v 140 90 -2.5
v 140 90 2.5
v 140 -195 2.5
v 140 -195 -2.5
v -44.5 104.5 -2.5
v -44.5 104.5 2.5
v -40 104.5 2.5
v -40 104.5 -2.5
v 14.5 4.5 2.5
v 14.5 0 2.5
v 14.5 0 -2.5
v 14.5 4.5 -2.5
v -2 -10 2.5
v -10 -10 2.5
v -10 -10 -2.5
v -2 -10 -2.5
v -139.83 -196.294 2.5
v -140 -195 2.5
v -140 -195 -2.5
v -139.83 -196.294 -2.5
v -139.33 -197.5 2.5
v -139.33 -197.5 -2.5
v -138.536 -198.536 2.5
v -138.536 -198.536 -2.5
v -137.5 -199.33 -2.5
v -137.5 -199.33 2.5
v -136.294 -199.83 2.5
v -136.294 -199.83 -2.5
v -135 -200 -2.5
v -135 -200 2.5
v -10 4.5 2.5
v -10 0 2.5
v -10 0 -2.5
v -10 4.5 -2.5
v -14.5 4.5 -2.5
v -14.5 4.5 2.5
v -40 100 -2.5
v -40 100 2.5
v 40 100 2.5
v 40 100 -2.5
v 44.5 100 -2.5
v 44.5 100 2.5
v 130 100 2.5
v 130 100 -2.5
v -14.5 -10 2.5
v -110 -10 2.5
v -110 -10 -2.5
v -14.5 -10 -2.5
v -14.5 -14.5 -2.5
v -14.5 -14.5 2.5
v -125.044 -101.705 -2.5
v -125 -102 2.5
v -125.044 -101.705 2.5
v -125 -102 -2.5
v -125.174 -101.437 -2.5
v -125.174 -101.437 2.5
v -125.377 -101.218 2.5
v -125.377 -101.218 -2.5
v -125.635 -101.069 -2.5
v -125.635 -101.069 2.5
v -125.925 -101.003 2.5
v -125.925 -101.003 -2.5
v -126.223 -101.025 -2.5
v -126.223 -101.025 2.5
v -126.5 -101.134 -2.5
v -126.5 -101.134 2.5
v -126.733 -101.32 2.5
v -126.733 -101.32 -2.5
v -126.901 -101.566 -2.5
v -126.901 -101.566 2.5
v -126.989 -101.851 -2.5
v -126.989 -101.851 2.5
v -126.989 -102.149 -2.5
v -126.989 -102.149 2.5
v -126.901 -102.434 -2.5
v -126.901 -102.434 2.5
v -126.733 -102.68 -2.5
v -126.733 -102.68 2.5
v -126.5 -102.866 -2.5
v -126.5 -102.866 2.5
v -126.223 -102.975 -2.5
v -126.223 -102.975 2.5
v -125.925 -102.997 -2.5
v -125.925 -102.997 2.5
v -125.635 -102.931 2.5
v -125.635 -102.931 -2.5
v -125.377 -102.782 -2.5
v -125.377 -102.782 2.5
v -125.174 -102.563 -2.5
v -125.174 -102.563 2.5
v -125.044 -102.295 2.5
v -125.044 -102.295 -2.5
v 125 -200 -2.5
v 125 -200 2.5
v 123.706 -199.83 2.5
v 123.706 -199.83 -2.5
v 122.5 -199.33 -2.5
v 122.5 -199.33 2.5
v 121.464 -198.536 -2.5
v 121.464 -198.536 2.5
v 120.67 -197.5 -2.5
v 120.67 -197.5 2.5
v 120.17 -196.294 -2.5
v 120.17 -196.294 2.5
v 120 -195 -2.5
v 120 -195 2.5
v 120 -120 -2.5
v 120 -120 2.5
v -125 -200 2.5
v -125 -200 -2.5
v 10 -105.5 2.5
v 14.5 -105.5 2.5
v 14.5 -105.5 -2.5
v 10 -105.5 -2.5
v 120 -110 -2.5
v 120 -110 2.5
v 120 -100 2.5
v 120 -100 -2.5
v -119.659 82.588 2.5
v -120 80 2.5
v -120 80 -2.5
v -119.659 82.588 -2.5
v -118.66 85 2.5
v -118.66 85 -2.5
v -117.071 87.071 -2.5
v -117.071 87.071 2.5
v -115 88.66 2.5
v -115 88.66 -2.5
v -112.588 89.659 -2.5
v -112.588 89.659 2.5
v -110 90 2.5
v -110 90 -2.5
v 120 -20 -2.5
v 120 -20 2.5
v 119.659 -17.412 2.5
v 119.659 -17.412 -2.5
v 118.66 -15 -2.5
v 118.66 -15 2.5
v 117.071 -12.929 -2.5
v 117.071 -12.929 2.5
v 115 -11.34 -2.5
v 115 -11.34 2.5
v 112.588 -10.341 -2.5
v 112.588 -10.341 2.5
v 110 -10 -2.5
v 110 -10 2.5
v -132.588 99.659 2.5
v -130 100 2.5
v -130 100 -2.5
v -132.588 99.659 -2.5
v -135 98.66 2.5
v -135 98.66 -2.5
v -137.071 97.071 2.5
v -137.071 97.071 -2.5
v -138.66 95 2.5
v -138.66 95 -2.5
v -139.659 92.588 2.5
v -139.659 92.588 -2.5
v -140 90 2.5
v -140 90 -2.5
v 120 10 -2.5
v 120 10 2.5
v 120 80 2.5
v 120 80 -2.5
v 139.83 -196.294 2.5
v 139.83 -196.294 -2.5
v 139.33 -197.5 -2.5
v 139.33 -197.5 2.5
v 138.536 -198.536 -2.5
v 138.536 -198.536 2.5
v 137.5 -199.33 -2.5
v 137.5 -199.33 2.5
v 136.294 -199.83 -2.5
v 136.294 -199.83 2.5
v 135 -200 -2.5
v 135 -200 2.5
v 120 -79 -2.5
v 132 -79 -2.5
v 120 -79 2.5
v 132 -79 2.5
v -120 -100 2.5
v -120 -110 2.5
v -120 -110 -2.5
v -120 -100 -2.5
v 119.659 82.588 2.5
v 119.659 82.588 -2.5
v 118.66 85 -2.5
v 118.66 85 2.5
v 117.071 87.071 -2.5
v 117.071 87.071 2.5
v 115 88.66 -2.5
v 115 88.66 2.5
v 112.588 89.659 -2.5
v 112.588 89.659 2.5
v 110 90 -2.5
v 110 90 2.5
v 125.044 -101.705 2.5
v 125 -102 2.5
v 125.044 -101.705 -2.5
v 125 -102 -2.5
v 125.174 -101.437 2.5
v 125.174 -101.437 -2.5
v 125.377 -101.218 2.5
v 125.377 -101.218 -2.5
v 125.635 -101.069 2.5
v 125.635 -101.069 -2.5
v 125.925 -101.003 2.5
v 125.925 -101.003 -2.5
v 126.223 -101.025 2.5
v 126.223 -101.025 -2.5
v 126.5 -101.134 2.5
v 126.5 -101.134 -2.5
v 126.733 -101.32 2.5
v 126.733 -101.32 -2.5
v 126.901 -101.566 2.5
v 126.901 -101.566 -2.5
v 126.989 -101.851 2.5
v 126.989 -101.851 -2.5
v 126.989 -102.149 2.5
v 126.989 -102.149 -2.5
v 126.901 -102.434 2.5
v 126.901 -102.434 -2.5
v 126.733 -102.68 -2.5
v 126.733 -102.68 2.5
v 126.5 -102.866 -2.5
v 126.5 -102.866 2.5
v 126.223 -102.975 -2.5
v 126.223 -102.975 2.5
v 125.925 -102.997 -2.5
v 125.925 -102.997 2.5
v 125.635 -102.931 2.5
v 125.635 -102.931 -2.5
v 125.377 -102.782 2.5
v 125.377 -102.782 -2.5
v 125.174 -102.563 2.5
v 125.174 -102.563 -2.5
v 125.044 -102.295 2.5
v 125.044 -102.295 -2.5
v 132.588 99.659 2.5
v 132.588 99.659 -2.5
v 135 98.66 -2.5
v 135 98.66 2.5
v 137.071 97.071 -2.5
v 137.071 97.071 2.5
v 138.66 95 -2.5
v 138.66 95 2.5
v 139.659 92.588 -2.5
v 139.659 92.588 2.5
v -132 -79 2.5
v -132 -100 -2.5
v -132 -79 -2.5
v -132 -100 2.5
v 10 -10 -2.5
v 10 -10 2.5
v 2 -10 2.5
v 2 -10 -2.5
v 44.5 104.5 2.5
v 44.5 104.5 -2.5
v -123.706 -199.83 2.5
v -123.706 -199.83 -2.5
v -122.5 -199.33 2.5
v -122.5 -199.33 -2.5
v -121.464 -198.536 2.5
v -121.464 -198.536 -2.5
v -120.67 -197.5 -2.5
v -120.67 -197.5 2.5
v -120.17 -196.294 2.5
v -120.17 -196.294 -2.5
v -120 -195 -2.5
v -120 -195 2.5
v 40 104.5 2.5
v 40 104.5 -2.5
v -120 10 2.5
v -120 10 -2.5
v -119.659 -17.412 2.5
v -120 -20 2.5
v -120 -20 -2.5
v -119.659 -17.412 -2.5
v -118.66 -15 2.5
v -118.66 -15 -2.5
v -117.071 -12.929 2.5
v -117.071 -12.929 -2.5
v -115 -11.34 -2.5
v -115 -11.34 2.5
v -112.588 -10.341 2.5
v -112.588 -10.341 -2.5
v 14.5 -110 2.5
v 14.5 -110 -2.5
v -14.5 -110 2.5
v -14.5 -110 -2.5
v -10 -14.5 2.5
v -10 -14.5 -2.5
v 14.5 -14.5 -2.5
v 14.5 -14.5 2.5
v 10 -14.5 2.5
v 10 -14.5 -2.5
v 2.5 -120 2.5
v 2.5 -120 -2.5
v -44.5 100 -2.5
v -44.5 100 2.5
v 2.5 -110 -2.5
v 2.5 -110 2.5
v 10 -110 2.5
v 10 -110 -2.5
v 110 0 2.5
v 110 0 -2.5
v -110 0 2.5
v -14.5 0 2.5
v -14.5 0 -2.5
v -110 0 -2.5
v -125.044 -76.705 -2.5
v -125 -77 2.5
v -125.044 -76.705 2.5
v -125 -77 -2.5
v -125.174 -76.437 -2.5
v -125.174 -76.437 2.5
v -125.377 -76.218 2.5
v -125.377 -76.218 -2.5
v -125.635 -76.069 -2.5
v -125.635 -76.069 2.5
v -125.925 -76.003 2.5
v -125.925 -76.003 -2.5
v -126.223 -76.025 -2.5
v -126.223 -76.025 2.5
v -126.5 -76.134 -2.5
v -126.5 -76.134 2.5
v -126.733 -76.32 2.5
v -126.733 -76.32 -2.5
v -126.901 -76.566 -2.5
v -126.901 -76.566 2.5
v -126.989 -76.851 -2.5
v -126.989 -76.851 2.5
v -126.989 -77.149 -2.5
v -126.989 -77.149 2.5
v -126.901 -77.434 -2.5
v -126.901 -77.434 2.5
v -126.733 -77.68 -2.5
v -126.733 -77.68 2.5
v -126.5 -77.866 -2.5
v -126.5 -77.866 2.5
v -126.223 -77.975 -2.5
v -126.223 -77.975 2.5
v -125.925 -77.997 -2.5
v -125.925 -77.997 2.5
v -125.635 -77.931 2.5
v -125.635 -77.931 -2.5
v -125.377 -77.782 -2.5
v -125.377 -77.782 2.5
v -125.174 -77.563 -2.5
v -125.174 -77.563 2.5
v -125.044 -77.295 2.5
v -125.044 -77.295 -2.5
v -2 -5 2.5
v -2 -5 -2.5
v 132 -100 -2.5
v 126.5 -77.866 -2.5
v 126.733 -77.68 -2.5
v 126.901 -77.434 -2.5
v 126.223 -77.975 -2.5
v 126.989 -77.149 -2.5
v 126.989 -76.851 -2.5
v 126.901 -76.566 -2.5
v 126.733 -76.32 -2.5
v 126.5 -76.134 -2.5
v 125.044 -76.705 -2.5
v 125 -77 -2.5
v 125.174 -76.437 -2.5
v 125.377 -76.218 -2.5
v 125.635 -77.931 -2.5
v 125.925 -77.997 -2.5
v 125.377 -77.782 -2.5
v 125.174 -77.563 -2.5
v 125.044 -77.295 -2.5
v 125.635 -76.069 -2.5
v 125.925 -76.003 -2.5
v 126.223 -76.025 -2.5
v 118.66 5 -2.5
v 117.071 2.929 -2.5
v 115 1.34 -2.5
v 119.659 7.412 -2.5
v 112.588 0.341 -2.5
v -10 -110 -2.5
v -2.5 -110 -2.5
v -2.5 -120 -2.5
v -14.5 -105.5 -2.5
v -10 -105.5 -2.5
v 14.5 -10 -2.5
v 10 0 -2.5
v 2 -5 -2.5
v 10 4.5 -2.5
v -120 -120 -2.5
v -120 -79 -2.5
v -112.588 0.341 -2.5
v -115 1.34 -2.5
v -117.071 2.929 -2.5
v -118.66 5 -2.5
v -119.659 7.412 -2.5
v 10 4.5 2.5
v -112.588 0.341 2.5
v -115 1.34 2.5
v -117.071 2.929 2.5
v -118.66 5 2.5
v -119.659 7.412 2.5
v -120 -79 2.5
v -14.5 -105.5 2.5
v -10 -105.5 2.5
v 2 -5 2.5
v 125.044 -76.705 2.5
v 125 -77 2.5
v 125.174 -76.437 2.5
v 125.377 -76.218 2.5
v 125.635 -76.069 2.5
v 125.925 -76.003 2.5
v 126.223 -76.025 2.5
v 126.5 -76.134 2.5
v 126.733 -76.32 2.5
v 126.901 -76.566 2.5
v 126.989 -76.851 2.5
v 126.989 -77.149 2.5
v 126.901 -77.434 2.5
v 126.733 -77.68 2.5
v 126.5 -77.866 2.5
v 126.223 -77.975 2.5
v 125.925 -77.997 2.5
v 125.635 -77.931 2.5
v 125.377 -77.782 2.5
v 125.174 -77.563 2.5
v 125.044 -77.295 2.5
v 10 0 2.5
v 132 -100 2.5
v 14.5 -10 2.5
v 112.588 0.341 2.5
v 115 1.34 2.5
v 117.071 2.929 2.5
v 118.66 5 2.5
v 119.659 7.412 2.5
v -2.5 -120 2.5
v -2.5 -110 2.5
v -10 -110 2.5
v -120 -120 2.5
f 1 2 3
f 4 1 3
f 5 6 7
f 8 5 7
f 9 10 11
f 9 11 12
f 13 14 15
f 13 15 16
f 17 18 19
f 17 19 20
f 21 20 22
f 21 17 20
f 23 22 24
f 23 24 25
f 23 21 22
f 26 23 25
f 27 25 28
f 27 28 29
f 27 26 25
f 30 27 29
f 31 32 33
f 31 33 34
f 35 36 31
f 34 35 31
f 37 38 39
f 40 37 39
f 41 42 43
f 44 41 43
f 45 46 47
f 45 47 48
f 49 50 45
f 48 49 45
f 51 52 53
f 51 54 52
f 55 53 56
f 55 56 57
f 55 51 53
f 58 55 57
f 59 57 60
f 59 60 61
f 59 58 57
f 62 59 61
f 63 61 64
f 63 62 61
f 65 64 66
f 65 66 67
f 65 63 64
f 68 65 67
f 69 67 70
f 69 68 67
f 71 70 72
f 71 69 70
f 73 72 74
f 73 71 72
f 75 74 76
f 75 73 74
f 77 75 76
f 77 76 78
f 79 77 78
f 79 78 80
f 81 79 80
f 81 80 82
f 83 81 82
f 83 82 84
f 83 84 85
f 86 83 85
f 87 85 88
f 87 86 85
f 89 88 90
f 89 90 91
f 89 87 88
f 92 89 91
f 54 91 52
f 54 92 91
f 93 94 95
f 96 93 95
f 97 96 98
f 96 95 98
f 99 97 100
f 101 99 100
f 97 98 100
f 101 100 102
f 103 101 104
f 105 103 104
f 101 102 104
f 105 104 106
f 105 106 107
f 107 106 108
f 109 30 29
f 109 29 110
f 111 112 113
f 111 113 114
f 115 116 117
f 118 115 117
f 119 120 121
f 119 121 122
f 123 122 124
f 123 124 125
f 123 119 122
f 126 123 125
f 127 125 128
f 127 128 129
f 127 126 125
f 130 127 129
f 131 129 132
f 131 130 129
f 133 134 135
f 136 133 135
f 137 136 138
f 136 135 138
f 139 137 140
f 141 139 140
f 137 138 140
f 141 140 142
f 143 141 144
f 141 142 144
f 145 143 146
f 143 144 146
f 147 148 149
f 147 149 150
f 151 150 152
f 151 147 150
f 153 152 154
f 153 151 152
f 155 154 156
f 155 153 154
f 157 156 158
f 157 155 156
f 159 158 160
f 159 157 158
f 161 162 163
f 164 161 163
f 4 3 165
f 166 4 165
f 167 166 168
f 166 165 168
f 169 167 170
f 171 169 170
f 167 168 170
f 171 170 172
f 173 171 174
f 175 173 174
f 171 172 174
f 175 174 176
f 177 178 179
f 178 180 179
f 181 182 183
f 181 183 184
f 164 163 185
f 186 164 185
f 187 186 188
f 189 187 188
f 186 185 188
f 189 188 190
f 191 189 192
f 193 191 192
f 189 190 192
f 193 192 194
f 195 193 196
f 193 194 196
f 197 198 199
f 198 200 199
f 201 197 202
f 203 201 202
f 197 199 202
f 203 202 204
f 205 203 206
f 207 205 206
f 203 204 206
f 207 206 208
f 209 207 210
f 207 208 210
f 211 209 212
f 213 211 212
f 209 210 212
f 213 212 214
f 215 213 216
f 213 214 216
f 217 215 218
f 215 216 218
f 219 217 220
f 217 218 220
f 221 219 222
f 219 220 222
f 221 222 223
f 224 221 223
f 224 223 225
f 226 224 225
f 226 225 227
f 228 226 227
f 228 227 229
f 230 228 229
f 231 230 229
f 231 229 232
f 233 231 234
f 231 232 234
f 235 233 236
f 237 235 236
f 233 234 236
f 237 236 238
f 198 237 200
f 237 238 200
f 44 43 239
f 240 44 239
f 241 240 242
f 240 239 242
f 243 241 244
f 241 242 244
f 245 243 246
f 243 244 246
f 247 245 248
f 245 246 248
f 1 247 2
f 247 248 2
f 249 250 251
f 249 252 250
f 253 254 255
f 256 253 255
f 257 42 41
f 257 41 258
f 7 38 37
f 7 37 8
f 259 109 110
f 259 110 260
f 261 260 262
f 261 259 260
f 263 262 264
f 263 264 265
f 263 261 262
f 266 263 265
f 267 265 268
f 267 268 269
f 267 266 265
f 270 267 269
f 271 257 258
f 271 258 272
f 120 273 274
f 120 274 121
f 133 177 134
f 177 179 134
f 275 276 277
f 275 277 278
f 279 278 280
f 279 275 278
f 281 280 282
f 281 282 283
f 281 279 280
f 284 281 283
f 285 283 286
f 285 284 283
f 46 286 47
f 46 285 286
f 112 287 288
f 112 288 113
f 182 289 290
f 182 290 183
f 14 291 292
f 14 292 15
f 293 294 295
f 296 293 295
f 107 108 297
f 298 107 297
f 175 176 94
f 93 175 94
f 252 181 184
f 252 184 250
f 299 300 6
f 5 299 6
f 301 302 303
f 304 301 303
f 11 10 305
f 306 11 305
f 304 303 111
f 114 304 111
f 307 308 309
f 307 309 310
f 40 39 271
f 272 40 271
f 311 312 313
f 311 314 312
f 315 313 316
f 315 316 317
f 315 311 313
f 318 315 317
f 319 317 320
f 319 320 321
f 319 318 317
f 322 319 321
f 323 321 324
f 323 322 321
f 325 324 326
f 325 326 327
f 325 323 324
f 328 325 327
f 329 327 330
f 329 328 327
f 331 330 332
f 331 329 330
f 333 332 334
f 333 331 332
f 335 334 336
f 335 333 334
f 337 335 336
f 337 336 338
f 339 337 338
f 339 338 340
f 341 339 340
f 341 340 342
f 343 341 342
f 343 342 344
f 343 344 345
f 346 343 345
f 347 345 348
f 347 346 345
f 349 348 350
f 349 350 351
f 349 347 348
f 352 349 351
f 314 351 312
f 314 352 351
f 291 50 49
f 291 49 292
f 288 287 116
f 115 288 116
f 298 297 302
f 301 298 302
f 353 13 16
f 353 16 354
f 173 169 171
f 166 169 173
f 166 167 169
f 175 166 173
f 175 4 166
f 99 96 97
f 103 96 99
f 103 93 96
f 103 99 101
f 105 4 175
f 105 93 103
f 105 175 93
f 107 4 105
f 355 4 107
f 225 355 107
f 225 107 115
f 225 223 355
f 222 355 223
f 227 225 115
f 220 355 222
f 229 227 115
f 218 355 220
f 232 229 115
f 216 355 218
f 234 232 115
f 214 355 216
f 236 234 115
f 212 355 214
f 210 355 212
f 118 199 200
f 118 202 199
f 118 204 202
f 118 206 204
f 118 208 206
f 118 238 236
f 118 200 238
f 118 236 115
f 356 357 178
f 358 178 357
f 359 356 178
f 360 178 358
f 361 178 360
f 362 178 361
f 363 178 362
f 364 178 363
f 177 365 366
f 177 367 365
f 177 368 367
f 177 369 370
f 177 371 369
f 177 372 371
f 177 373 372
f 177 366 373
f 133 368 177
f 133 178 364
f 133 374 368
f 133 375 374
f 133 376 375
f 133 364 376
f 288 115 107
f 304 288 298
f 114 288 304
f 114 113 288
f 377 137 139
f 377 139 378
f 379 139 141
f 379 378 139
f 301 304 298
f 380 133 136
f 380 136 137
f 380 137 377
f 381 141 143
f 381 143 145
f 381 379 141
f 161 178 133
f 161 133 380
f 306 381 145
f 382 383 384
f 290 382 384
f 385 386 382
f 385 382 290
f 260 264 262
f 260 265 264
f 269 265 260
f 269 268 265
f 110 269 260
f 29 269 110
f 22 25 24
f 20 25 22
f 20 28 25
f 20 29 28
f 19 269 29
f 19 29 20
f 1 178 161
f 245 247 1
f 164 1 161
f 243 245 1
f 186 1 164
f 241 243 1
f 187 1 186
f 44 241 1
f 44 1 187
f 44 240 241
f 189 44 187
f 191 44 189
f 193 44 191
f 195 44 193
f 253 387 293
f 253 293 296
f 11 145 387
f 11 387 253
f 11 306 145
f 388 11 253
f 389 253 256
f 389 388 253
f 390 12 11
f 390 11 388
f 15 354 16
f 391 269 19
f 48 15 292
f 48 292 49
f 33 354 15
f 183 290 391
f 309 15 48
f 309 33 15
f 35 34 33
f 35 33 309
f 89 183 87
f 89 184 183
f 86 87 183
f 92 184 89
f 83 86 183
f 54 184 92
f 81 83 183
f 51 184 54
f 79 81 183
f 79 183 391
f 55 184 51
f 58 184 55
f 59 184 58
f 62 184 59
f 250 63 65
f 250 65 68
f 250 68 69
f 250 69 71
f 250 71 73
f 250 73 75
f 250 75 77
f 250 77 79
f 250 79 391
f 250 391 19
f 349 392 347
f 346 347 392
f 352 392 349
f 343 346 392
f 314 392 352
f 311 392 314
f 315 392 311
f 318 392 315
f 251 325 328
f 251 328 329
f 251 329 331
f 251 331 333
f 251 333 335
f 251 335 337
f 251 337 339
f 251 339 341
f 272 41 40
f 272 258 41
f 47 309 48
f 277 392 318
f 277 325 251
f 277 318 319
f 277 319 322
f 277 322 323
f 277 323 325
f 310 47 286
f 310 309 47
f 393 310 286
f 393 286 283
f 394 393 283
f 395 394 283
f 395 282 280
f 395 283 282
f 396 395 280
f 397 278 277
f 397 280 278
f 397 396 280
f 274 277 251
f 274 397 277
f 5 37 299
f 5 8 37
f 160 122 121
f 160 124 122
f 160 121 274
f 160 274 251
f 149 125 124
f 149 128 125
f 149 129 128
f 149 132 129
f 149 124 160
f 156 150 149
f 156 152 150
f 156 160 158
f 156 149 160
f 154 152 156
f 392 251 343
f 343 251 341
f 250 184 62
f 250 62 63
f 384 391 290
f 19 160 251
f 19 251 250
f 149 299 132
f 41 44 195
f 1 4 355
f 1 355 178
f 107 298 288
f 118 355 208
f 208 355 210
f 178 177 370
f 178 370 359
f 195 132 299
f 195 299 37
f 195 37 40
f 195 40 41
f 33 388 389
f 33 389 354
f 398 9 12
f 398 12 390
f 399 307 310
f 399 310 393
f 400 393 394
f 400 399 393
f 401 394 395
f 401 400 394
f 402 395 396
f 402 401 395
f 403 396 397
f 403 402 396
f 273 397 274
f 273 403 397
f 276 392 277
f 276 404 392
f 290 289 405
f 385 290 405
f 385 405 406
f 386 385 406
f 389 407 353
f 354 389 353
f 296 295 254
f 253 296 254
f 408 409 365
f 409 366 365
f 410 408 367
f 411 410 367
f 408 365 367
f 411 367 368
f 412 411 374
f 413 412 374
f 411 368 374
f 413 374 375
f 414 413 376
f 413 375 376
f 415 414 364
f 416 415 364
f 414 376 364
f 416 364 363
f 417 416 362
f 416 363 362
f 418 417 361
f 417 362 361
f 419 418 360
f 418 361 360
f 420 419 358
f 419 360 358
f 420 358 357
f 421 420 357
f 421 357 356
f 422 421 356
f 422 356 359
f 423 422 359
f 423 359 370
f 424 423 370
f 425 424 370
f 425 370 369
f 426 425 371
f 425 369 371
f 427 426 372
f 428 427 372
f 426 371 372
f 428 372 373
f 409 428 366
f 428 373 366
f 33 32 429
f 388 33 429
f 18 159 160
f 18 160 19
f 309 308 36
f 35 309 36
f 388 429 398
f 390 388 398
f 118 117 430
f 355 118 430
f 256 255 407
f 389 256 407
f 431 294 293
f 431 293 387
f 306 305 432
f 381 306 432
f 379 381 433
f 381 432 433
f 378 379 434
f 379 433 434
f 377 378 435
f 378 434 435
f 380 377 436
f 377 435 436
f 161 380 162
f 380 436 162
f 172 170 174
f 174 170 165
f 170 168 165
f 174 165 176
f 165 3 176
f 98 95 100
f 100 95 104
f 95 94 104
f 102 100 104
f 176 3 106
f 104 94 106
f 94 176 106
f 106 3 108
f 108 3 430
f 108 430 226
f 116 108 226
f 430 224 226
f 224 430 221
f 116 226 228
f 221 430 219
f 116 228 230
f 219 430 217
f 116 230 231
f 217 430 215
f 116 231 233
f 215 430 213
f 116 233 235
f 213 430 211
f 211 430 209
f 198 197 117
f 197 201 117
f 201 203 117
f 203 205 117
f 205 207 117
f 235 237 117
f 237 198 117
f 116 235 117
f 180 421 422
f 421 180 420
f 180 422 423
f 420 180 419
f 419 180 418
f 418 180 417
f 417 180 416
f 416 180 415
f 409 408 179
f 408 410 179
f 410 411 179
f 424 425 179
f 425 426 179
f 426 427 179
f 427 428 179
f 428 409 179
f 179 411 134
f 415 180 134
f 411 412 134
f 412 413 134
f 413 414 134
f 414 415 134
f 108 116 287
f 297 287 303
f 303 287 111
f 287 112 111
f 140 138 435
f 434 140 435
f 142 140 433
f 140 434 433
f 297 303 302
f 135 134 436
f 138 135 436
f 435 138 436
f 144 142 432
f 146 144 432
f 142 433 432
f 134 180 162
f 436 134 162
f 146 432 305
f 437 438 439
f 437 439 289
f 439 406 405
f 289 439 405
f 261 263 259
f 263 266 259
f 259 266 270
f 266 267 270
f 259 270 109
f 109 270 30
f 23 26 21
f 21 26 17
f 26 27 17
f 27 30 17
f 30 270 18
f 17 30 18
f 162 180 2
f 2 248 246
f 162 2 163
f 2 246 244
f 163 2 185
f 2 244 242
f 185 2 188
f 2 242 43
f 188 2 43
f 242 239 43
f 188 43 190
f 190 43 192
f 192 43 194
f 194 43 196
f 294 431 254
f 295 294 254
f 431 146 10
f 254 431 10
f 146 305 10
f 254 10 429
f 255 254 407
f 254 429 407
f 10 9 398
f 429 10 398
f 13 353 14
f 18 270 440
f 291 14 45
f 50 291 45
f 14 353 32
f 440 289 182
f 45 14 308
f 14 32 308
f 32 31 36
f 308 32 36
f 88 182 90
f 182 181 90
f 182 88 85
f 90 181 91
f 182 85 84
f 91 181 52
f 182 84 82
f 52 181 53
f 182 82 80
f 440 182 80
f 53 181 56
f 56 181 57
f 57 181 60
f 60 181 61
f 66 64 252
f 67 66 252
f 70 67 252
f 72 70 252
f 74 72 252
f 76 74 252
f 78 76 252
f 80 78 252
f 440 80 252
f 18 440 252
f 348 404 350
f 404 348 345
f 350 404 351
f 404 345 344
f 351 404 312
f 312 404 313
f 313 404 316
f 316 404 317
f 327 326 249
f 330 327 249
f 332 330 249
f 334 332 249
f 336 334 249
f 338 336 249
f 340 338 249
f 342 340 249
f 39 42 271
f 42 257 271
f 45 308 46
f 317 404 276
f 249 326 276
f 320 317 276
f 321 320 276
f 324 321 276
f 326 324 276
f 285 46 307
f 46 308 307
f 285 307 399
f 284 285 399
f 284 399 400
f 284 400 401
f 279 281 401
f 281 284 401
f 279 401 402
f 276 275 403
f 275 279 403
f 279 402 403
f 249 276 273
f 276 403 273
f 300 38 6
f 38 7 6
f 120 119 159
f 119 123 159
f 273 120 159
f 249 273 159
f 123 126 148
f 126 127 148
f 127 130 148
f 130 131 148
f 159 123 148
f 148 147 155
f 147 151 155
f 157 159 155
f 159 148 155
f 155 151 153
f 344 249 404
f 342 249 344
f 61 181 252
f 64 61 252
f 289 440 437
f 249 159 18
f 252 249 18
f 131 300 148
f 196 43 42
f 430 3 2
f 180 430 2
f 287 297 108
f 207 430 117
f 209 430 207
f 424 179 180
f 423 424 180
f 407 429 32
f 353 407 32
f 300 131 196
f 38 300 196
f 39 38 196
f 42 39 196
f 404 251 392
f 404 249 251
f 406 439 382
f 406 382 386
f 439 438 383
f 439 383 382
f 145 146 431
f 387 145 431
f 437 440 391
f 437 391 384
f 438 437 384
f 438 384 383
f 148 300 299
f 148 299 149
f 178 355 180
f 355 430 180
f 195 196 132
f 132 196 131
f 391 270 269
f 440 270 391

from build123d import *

# Parameters (mm, degrees)
SKETCH1_R           = 1
SKETCH1_W           = 4.5
SKETCH1_H           = 4.5
SKETCH1_W_2         = 2
SKETCH1_H_2         = 5
BOSS_EXTRUDE1_DEPTH = 2.5


with BuildPart() as part:
    # Sketch1 → Boss-Extrude1 (new body, symmetric)
    with BuildSketch(Plane.XY):
        with BuildLine():
            Line((-120, -79), (-120, -20))
            ThreePointArc((-120, -20), (-117.071067812, -12.928932188), (-110, -10))
            Line((-110, -10), (-14.5, -10))
            Line((-14.5, -10), (-10, -10))
            Line((-10, -10), (-2, -10))
            Line((-2, -10), (-2, -5))
            Line((-2, -5), (-2, 0))
            Line((-2, 0), (-10, 0))
            Line((-10, 0), (-14.5, 0))
            Line((-14.5, 0), (-110, 0))
            ThreePointArc((-110, 0), (-117.071067812, 2.928932188), (-120, 10))
            Line((-120, 10), (-120, 80))
            ThreePointArc((-120, 80), (-117.071067812, 87.071067812), (-110, 90))
            Line((-110, 90), (0, 90))
            Line((0, 90), (0, 100))
            Line((0, 100), (-40, 100))
            Line((-40, 100), (-44.5, 100))
            Line((-44.5, 100), (-120, 100))
            Line((-120, 100), (-130, 100))
            ThreePointArc((-130, 100), (-137.071067812, 97.071067812), (-140, 90))
            Line((-140, 90), (-140, -195))
            ThreePointArc((-140, -195), (-138.535533906, -198.535533906), (-135, -200))
            Line((-135, -200), (-125, -200))
            ThreePointArc((-125, -200), (-121.464466094, -198.535533906), (-120, -195))
            Line((-120, -195), (-120, -120))
            Line((-120, -120), (-120, -110))
            Line((-120, -110), (-120, -100))
            Line((-120, -100), (-132, -100))
            Line((-132, -100), (-132, -79))
            Line((-132, -79), (-120, -79))
        make_face()
        with Locations((-126, -102)):
            Circle(SKETCH1_R, mode=Mode.SUBTRACT)
        with Locations((-126, -77)):
            Circle(SKETCH1_R, mode=Mode.SUBTRACT)
        with Locations((-42.25, 102.25)):
            Rectangle(SKETCH1_W, SKETCH1_H)
        with Locations((-12.25, 2.25)):
            Rectangle(SKETCH1_W, SKETCH1_H)
        with Locations((-12.25, -12.25)):
            Rectangle(SKETCH1_W, SKETCH1_H)
        with Locations((-1, -2.5)):
            Rectangle(SKETCH1_W_2, SKETCH1_H_2)
        Polygon((-14.5, -110), (-120, -110), (-120, -120), (-2.5, -120), (-2.5, -110), (-10, -110), align=None)
        with Locations((-12.25, -107.75)):
            Rectangle(SKETCH1_W, SKETCH1_H)
    extrude(amount=BOSS_EXTRUDE1_DEPTH, both=True)

    # Mirror1: part across plane


with BuildPart() as part_1:
    add(part.part)
    add(part.part.mirror(Plane(origin=(0, 0, 0), x_dir=(0, 0, 1), z_dir=(1, 0, 0))))


solid = part_1.part
